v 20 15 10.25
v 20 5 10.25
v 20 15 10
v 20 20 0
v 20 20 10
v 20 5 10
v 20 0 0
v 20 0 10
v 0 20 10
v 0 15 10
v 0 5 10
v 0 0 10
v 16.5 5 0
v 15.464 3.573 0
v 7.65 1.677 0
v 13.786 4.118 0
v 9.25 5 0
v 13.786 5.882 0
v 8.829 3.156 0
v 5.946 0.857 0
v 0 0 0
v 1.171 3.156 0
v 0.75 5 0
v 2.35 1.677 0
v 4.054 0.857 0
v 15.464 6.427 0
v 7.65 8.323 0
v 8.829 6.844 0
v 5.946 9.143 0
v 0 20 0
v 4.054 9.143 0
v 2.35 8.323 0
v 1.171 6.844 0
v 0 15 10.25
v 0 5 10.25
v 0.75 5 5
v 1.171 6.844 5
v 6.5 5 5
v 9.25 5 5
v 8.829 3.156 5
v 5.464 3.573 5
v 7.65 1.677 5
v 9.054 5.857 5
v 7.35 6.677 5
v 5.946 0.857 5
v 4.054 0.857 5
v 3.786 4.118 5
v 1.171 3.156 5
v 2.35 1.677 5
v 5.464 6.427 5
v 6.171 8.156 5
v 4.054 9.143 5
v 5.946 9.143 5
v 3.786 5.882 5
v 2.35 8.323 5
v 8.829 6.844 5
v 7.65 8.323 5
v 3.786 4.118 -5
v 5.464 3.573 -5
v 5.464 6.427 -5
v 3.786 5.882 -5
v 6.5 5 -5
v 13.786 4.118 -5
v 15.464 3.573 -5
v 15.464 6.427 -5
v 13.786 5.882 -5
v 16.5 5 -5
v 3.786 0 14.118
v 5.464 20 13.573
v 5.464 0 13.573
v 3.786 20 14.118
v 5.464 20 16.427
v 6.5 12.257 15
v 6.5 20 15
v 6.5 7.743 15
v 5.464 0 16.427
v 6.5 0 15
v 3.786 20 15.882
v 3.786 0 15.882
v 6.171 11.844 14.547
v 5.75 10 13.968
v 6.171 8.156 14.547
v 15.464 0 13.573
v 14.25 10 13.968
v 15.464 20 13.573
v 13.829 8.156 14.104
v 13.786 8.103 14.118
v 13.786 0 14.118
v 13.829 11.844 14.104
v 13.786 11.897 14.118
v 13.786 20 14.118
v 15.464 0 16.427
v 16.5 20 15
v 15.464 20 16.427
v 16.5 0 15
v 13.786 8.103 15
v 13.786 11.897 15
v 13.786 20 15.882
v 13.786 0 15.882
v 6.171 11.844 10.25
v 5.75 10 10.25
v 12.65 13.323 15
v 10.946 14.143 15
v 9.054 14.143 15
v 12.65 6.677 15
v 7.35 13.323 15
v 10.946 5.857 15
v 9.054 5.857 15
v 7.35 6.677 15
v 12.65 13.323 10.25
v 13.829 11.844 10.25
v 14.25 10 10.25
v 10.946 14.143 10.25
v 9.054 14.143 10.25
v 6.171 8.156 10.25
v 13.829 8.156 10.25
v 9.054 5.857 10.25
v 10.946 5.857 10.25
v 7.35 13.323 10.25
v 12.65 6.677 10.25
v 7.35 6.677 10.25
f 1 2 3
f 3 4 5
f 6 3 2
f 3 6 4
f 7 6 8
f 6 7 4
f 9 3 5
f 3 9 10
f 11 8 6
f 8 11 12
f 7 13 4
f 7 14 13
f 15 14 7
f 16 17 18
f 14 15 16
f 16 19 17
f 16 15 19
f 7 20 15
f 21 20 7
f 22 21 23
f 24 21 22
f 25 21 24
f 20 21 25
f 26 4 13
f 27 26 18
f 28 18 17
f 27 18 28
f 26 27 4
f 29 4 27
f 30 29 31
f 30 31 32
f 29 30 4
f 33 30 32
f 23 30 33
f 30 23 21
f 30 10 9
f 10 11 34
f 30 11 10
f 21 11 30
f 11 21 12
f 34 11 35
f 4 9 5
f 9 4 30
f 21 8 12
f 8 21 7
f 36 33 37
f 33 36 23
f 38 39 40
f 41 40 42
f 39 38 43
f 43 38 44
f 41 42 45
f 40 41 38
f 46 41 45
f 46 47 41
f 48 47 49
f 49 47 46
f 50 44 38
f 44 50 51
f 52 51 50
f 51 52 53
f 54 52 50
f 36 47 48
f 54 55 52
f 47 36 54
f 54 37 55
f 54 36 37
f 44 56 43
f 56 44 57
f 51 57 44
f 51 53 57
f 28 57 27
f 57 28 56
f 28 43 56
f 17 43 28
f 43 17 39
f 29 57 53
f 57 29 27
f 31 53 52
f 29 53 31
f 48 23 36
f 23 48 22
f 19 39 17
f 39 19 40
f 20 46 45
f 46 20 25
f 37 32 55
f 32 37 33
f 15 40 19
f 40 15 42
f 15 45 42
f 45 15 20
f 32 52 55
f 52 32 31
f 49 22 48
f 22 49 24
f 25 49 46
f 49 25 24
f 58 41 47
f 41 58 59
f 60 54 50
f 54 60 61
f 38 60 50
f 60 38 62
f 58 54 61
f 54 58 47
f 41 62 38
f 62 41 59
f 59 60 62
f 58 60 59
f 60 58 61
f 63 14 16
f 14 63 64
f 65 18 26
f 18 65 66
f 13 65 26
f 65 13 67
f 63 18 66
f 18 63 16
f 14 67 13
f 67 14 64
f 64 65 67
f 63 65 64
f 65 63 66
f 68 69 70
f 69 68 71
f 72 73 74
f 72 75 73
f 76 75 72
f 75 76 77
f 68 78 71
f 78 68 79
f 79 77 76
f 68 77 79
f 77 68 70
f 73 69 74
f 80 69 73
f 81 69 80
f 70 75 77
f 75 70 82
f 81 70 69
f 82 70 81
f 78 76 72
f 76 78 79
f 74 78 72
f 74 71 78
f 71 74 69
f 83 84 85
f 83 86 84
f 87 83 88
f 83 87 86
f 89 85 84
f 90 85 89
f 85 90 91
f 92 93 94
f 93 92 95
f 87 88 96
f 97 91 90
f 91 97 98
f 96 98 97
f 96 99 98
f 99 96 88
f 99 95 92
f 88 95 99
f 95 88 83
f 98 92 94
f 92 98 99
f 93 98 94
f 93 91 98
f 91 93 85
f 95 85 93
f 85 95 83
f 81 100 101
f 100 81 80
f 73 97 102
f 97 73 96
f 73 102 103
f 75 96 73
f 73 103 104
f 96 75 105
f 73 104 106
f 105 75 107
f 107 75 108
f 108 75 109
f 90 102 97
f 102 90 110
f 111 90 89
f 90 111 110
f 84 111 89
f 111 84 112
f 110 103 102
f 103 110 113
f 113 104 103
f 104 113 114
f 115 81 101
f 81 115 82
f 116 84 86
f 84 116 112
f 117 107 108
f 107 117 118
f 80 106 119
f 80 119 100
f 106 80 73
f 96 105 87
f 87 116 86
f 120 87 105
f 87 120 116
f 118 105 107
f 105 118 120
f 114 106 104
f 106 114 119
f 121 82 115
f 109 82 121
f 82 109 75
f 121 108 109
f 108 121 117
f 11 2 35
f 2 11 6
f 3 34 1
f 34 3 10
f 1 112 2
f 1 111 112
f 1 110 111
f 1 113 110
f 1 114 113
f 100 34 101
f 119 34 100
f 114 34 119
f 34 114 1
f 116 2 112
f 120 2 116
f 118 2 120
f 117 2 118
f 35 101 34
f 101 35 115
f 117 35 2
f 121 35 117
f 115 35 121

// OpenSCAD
module shaft_support_bracket() {
    base_block();
    rod_seat_bore();
    mounting_holes();
    clamp_split();
    clamp_bolt_holes();
}

module base_block() {
    difference() {
        cube([20, 20, 10]);
        translate([5, 5, 0])
            cylinder(h = 10, d = 8.5, center = true);
    }
}

module rod_seat_bore() {
    translate([10, 10, 10])
        cylinder(h = 10, d = 8.5, center = true);
}

module mounting_holes() {
    translate([5, 5, 0])
        cylinder(h = 10, d = 3, center = true);
    translate([15, 5, 0])
        cylinder(h = 10, d = 3, center = true);
}

module clamp_split() {
    translate([10, 10, 10])
        rotate([90, 0, 0])
        cube([20, 0.5, 10], center = true);
}

module clamp_bolt_holes() {
    translate([5, 10, 15])
        rotate([90, 0, 0])
        cylinder(h = 20, d = 3, center = true);
    translate([15, 10, 15])
        rotate([90, 0, 0])
        cylinder(h = 20, d = 3, center = true);
}

shaft_support_bracket();
